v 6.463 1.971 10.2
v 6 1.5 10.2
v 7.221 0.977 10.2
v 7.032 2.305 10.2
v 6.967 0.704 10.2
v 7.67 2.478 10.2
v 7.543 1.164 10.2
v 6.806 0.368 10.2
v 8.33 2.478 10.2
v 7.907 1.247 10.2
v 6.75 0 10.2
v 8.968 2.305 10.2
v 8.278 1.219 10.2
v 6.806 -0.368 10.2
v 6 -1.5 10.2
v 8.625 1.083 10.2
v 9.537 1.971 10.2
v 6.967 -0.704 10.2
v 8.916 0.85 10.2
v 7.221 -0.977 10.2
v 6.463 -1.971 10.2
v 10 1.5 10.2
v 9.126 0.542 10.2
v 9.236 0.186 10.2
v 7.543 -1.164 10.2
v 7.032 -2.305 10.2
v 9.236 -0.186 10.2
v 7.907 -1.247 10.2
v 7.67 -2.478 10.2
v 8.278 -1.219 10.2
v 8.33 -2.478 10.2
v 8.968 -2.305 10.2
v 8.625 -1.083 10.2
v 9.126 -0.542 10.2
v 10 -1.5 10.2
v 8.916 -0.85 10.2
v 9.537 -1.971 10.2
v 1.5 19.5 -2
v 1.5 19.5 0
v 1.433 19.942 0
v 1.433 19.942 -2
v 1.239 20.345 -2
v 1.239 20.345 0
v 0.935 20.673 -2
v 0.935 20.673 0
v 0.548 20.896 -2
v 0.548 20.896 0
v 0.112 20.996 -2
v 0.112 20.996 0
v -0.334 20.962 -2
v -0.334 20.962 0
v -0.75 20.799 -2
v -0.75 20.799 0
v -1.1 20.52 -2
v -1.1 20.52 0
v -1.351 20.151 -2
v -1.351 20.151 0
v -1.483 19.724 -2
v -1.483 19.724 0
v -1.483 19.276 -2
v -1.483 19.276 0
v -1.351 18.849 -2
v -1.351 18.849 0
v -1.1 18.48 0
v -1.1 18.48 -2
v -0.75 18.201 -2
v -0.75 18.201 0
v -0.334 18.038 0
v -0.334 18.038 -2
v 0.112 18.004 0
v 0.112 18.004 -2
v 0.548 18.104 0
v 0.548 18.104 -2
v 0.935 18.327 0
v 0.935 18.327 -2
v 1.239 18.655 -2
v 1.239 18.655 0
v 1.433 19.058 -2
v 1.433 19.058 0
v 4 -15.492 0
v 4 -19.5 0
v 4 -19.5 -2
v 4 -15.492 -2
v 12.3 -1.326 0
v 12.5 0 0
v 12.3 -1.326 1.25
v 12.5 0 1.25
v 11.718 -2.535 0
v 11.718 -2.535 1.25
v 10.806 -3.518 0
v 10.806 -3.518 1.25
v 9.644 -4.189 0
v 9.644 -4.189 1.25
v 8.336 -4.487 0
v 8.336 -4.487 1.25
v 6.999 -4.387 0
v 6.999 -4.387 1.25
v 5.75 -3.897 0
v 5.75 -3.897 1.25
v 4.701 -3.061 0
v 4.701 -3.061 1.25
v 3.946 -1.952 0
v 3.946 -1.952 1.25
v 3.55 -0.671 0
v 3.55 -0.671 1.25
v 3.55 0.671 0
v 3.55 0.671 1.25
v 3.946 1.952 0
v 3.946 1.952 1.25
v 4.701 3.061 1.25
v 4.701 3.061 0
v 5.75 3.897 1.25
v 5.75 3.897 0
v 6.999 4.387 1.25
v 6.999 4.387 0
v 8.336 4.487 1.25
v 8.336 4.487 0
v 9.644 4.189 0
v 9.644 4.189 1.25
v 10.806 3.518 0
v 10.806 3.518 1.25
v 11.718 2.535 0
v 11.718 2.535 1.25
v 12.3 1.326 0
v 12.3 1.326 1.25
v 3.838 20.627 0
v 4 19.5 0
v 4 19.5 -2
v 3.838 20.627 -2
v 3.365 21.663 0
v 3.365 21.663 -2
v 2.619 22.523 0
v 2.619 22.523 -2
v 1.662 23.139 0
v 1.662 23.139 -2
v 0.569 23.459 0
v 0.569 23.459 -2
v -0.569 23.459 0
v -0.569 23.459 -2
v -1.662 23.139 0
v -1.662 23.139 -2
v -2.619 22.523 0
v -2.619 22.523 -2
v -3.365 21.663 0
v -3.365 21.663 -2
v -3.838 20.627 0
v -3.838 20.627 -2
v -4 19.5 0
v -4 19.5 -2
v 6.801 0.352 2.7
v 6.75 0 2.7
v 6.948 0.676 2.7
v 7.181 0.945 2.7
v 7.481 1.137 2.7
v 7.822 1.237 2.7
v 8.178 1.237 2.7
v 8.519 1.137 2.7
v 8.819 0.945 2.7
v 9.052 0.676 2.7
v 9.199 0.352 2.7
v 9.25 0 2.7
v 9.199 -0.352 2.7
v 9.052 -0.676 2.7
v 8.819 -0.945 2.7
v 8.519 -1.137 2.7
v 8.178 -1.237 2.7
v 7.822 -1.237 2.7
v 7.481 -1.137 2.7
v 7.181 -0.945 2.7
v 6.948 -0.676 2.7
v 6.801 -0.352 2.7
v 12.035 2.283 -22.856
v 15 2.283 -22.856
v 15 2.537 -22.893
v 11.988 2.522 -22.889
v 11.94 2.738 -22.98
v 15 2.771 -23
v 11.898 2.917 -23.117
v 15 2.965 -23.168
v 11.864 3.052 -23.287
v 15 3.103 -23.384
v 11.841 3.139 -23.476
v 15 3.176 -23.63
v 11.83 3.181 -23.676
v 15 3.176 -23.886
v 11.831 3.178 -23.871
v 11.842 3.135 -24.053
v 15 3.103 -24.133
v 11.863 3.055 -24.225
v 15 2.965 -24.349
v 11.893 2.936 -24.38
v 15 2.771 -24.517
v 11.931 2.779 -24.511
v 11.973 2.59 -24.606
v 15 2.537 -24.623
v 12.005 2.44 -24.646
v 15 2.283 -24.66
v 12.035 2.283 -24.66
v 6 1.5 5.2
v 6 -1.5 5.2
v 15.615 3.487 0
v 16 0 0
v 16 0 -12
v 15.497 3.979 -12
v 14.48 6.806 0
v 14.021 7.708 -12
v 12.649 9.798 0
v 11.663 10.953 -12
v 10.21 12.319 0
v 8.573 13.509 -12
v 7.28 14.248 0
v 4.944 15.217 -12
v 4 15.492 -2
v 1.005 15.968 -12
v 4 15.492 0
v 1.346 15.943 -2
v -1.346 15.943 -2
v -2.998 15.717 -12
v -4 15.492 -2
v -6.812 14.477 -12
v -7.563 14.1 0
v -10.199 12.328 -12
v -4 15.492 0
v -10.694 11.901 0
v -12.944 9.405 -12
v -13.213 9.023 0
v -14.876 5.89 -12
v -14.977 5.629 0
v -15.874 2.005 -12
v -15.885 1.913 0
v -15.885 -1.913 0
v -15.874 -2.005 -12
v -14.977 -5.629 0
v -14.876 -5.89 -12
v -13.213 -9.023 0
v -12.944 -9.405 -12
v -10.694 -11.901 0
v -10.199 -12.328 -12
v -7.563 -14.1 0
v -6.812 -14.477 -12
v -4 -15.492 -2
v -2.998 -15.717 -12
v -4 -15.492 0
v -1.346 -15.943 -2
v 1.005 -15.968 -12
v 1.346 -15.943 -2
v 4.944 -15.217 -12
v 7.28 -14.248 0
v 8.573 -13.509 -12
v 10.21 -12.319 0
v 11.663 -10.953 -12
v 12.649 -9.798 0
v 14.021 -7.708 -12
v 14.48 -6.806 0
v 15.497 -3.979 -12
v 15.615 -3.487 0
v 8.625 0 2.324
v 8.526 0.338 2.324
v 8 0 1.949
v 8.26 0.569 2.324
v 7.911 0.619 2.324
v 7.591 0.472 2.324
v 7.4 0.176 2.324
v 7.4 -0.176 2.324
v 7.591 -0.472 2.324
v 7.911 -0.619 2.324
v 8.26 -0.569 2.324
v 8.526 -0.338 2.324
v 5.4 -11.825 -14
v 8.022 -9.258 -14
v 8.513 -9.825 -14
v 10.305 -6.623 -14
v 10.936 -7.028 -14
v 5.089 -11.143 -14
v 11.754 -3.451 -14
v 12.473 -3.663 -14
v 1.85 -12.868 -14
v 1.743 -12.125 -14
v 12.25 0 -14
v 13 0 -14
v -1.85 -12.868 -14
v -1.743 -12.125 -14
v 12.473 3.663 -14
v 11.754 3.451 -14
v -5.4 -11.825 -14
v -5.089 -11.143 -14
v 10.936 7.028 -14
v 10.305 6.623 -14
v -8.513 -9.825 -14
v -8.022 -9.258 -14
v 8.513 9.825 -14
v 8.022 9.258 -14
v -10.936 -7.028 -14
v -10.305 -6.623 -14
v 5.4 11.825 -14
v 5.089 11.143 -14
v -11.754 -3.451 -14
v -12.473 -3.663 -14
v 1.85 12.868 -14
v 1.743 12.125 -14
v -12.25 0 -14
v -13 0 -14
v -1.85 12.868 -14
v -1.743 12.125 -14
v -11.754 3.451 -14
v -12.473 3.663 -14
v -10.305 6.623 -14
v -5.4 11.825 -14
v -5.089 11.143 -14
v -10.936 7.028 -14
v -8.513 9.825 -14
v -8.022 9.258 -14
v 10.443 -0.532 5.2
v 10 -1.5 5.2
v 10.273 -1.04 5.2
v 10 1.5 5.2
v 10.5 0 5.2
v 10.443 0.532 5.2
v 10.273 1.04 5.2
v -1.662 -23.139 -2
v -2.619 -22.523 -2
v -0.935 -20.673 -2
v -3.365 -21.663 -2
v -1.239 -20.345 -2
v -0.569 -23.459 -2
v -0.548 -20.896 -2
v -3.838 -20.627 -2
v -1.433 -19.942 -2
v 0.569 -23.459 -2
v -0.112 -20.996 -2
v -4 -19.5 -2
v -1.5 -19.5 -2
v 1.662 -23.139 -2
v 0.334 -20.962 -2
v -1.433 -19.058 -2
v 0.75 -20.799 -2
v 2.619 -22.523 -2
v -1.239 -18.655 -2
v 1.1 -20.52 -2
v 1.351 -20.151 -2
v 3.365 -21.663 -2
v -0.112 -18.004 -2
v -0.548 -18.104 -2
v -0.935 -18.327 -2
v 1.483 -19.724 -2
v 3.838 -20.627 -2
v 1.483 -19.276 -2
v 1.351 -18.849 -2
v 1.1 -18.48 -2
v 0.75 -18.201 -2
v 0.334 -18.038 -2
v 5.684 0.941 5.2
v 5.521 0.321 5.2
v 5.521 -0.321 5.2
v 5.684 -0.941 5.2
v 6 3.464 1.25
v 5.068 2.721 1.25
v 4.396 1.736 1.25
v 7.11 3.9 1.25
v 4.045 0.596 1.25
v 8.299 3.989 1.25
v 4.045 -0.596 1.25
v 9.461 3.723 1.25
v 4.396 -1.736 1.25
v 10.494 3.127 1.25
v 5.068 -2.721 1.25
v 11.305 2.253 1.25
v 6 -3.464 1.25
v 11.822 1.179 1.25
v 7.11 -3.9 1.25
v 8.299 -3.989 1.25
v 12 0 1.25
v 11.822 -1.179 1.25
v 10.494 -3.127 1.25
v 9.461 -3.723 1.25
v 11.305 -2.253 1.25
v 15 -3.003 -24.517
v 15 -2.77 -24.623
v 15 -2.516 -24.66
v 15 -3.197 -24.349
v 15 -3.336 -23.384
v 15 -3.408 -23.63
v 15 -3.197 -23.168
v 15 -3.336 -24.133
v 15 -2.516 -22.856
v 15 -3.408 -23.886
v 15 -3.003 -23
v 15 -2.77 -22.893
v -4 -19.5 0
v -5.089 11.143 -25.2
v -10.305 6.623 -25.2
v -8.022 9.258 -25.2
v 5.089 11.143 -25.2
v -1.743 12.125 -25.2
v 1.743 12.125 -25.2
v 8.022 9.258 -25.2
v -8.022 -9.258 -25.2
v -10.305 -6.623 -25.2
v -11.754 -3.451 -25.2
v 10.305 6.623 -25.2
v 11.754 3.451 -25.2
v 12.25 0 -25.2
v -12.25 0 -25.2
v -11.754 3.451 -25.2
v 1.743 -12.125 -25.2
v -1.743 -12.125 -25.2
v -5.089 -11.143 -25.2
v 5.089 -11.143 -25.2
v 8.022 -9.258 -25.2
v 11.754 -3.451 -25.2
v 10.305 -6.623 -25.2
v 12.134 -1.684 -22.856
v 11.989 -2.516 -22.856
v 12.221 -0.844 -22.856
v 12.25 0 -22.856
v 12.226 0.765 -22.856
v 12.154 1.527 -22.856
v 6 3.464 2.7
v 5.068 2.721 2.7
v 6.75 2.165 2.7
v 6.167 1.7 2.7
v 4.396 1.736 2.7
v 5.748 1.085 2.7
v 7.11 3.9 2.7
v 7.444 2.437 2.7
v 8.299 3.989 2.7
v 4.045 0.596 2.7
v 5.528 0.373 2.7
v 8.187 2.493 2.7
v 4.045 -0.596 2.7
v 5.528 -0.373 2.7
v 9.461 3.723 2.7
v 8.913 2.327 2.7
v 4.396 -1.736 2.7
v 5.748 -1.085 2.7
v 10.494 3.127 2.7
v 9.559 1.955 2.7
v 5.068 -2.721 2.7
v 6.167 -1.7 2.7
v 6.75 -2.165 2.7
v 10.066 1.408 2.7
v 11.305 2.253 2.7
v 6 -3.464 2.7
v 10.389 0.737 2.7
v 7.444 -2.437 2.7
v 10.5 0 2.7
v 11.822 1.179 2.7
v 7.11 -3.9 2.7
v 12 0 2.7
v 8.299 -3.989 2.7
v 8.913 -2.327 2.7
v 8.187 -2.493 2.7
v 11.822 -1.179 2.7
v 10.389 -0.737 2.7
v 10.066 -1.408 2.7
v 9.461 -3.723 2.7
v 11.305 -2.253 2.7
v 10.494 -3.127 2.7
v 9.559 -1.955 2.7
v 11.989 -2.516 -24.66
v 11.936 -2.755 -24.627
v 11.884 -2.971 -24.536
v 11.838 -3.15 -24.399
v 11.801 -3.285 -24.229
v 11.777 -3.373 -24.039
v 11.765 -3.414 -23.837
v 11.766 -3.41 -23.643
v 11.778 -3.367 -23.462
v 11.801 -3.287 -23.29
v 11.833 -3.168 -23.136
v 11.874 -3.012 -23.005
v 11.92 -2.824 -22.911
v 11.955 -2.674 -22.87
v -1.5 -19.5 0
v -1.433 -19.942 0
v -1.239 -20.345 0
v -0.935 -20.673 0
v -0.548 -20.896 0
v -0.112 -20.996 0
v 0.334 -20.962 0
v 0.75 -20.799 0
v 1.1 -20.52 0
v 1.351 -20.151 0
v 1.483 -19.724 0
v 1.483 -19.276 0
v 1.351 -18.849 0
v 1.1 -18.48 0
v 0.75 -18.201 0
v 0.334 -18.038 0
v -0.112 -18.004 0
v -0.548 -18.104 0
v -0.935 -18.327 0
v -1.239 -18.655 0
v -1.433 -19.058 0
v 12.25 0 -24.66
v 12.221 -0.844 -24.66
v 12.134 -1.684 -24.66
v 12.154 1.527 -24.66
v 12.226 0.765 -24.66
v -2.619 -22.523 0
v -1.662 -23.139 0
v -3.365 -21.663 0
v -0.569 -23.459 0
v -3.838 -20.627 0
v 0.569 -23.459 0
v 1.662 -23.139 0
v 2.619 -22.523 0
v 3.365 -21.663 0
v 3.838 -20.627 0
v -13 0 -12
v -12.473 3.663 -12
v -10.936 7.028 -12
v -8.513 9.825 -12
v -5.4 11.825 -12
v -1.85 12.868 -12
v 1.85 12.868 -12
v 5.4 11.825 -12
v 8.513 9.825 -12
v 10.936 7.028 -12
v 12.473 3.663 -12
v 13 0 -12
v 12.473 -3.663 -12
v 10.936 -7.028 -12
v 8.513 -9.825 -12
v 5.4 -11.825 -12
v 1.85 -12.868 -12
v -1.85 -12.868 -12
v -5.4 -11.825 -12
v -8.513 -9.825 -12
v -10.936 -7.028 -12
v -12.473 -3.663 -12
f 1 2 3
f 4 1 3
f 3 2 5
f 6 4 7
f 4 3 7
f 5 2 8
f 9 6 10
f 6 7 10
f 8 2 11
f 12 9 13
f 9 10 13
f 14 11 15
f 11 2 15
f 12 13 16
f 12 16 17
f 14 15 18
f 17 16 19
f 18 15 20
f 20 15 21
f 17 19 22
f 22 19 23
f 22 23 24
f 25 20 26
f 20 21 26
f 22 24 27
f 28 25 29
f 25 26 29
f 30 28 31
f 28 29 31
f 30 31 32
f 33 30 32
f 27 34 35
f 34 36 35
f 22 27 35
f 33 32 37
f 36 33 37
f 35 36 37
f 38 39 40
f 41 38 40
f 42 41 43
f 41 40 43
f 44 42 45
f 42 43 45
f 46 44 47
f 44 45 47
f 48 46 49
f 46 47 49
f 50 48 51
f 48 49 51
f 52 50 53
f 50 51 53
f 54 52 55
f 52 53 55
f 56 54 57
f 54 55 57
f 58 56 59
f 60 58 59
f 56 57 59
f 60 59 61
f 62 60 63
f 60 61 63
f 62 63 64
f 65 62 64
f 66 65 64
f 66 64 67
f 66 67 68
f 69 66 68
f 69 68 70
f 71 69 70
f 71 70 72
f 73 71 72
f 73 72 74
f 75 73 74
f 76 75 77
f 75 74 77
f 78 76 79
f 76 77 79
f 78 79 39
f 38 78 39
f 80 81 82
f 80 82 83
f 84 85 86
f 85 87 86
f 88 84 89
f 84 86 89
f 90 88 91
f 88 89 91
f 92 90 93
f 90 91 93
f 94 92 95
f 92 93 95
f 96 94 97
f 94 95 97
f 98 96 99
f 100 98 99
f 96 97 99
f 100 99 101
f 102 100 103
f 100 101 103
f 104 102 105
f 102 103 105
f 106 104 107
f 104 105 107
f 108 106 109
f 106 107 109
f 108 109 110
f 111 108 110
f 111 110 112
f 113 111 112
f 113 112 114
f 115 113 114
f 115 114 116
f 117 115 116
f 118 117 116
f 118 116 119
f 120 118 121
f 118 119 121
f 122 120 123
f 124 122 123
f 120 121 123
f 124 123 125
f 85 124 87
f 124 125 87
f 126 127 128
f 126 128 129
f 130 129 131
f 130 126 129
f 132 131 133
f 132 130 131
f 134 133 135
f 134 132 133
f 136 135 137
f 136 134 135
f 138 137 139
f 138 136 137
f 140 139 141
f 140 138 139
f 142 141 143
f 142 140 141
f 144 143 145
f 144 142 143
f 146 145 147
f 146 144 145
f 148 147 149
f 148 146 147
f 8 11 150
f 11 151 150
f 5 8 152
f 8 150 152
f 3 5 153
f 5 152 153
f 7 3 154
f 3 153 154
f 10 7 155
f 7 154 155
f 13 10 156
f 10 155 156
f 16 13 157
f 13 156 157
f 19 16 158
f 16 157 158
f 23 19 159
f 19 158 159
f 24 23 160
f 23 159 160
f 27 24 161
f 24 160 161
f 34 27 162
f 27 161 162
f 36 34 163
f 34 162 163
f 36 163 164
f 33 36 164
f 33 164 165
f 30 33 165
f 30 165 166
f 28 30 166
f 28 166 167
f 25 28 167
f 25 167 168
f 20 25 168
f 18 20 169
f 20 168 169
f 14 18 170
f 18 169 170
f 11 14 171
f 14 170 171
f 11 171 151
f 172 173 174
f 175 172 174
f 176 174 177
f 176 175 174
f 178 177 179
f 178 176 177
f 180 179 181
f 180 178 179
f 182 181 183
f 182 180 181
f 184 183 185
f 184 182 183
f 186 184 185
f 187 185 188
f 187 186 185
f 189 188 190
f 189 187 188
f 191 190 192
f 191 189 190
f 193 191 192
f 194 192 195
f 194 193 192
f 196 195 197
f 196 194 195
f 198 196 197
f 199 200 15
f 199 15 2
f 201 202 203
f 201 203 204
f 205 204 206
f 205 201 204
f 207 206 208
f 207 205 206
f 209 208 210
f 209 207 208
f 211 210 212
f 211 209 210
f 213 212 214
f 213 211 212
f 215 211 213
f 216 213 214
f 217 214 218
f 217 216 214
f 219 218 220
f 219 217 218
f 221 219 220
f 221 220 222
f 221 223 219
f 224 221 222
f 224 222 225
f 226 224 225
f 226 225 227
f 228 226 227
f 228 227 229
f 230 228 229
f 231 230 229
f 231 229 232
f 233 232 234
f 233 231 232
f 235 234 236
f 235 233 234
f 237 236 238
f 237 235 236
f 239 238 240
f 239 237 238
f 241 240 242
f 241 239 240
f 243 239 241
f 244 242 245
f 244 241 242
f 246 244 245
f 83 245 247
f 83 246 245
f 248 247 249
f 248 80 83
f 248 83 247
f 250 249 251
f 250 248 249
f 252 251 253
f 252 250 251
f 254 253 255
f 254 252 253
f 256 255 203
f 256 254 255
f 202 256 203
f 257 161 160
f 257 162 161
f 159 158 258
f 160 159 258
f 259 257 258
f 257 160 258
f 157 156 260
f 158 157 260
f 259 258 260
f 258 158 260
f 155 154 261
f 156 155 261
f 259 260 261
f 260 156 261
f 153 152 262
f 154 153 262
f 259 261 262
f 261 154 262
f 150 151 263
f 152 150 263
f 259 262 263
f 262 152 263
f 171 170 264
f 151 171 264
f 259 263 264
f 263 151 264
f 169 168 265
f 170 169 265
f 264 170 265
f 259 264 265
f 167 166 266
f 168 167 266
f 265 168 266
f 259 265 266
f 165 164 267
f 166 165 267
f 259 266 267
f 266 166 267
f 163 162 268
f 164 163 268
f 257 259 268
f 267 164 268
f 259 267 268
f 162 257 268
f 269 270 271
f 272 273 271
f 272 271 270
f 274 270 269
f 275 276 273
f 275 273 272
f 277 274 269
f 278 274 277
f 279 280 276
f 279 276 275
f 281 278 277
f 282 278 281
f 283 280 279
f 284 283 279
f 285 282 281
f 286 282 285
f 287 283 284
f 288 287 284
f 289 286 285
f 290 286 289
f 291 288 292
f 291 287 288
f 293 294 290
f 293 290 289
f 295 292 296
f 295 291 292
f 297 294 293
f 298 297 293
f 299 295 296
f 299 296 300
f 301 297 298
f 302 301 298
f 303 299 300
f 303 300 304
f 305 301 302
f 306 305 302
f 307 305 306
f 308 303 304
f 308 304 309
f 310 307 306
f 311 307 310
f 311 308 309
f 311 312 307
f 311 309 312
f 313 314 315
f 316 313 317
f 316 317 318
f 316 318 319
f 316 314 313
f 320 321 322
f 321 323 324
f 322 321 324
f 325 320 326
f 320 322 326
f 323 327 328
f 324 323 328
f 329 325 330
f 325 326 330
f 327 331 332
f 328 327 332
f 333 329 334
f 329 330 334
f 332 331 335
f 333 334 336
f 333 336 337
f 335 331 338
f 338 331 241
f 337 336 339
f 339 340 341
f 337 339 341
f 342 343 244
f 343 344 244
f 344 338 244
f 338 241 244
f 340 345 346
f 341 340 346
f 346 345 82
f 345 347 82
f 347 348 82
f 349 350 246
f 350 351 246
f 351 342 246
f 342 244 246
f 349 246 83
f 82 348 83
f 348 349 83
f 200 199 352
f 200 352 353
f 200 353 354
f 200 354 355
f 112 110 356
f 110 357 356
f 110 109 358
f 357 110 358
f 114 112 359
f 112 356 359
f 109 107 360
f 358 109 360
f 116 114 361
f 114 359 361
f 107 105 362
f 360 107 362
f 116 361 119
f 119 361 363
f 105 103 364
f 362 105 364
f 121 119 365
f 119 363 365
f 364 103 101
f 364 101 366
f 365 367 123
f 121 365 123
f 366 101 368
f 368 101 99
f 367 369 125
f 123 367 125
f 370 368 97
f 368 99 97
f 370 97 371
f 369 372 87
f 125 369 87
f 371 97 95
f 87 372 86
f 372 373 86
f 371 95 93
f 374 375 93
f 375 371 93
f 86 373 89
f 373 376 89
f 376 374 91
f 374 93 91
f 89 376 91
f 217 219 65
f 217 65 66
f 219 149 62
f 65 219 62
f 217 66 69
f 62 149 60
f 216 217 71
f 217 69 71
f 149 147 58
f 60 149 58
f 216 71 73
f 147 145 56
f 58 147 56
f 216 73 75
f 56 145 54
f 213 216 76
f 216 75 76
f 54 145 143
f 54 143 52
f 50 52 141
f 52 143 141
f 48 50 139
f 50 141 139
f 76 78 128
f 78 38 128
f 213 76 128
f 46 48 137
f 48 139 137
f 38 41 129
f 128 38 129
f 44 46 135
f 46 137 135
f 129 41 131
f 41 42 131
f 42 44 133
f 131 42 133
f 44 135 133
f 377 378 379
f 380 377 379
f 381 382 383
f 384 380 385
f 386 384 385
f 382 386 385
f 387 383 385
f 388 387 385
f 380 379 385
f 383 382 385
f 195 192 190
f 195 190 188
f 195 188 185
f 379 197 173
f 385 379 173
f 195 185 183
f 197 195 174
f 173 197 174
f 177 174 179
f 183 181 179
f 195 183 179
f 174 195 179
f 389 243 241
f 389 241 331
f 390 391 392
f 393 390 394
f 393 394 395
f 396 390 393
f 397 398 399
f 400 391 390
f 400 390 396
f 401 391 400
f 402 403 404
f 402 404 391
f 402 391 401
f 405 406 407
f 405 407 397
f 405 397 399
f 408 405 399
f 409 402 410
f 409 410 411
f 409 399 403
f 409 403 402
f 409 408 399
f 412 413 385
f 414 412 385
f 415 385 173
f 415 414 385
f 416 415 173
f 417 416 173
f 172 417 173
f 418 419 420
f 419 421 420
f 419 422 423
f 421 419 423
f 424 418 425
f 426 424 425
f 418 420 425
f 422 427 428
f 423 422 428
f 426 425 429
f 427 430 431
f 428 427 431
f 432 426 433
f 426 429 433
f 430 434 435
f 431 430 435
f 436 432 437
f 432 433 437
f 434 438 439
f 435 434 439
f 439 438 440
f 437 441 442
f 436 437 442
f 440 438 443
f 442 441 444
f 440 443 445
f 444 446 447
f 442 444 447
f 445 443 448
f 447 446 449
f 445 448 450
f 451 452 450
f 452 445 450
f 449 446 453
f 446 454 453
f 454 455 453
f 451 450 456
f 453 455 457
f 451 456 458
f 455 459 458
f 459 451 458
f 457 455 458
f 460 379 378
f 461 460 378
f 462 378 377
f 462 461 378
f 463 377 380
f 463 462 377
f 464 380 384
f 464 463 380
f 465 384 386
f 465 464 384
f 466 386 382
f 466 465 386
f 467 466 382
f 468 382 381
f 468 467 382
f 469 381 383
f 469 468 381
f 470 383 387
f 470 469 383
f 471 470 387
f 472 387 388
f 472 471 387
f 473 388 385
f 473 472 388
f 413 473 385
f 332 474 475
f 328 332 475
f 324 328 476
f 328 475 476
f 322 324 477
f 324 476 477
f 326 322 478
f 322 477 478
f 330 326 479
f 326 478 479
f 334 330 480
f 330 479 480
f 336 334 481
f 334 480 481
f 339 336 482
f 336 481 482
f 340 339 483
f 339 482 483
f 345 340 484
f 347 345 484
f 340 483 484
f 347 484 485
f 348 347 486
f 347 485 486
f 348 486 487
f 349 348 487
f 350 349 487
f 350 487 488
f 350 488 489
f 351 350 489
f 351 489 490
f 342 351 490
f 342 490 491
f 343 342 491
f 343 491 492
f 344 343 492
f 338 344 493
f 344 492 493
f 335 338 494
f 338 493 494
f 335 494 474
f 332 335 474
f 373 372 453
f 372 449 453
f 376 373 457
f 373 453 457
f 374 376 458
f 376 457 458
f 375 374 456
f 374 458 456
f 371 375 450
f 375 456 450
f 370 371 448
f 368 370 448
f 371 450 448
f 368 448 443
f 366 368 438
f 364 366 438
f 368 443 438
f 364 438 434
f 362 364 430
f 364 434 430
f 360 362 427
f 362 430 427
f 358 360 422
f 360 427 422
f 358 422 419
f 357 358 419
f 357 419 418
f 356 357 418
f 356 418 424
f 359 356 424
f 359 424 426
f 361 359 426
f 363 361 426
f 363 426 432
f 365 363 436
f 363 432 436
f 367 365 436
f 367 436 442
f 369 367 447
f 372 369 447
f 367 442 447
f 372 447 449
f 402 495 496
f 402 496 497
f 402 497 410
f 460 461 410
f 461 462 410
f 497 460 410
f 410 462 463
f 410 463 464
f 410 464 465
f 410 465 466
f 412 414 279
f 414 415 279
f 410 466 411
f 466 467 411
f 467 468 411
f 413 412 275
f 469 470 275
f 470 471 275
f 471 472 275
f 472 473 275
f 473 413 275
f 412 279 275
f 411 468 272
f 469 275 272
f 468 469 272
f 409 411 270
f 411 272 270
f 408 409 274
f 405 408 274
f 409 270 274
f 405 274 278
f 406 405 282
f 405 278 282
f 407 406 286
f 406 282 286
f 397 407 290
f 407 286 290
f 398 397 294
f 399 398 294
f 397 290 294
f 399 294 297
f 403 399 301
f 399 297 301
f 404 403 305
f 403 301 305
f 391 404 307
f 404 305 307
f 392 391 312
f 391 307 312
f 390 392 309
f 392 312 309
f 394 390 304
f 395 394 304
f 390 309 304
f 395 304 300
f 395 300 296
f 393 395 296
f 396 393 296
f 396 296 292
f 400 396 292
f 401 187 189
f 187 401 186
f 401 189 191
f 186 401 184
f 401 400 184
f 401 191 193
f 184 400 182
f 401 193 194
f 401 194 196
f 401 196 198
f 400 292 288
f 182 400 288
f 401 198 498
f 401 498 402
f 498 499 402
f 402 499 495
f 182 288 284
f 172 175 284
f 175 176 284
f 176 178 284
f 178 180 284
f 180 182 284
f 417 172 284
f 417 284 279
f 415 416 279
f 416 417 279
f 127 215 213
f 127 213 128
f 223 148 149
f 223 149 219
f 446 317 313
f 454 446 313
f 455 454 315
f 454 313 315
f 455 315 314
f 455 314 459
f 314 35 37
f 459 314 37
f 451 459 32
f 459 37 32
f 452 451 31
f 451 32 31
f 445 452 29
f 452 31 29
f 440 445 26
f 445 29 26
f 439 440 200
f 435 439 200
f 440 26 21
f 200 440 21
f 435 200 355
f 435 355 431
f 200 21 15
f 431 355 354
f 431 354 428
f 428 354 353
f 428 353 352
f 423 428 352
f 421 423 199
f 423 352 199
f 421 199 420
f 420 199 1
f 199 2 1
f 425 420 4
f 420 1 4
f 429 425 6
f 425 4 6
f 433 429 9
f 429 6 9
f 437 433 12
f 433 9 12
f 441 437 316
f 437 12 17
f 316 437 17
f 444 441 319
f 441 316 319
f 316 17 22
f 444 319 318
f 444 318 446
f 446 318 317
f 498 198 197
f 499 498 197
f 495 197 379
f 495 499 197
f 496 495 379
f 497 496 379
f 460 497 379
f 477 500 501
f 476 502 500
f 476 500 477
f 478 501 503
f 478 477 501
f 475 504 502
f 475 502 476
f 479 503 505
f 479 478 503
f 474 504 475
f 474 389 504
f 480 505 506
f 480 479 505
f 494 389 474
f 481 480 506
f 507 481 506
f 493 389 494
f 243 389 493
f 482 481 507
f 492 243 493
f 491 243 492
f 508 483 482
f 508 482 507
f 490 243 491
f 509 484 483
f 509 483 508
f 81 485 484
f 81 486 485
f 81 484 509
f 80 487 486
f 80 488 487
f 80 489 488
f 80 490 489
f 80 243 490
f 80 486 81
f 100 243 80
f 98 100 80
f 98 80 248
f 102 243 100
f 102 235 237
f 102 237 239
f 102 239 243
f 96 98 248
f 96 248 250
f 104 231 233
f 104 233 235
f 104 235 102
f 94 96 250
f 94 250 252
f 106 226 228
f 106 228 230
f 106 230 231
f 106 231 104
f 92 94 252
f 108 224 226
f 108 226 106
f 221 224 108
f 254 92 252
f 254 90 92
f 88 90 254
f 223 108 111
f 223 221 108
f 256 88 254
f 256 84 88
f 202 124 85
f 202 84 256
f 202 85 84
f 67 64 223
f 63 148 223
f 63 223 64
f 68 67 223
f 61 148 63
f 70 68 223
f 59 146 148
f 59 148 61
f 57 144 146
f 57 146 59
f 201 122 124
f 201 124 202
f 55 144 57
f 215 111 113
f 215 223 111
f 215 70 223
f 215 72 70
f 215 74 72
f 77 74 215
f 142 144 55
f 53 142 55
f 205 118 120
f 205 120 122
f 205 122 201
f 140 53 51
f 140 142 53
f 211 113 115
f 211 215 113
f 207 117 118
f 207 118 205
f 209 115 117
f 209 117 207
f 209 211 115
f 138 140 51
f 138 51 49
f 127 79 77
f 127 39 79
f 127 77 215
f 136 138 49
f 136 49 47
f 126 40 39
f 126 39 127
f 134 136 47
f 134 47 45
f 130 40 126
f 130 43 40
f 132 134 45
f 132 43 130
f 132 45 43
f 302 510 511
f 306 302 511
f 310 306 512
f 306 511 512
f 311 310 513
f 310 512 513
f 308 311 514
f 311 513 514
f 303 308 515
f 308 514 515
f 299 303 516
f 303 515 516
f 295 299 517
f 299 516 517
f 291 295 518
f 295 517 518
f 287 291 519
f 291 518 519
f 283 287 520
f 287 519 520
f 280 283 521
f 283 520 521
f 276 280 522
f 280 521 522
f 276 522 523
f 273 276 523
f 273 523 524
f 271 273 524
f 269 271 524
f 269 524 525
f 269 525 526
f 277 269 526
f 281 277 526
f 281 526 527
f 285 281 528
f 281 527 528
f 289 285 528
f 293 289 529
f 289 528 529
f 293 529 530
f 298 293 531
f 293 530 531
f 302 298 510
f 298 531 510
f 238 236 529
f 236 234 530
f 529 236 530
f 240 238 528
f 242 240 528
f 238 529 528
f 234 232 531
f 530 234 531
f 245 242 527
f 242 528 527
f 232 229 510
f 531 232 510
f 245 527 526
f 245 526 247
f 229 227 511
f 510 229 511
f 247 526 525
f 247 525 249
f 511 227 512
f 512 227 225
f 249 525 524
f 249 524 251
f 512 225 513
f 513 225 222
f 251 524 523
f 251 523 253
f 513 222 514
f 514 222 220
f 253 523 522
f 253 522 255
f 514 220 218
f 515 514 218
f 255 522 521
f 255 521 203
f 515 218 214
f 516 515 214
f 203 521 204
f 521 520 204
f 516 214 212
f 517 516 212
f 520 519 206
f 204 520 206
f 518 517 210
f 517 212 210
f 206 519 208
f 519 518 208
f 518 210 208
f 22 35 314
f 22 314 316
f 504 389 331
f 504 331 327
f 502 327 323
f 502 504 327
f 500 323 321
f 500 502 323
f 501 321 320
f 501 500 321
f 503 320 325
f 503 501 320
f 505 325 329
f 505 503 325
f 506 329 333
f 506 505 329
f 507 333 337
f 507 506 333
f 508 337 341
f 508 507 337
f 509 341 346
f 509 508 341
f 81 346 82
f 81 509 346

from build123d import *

# Parameters (mm, degrees)
SKETCH_1_R             = 16
EXTRUDE_1_DEPTH        = 12
SKETCH_2_R             = 13
EXTRUDE_2_DEPTH        = 2
SKETCH_3_R             = 12.25
EXTRUDE_4_DEPTH        = 11.2
SKETCH_4_R             = 1.5
EXTRUDE_5_DEPTH        = 2
SKETCH_21_W            = 0.599041837
SKETCH_21_H            = 5.051087673
CUT_EXTRUDE_2_DEPTH    = 5
HOLE_WIZARD_M3_1_D     = 2.5
HOLE_WIZARD_M3_1_DEPTH = 7.5
HOLE_WIZARD_M3_1_TIP   = 0.751075774
EXTRUDE_16_DEPTH       = 15


with BuildPart() as part:
    # 草图1 → 凸台-拉伸1 (new body)
    with BuildSketch(Plane.XY):
        Circle(SKETCH_1_R)
    extrude(amount=-EXTRUDE_1_DEPTH)

    # 草图2 → 凸台-拉伸2 (add)
    with BuildSketch(Plane(origin=(0, 0, -12), x_dir=(-1, 0, 0), z_dir=(0, 0, -1))):
        Circle(SKETCH_2_R)
    extrude(amount=EXTRUDE_2_DEPTH)

    # 草图3 → 凸台-拉伸4 (add)
    with BuildSketch(Plane(origin=(0, 0, -14), x_dir=(-1, 0, 0), z_dir=(0, 0, -1))):
        with Locations(Location((0, 0, 0), (0, 0, 180))):
            Circle(SKETCH_3_R)
    extrude(amount=EXTRUDE_4_DEPTH)

    # 草图4 → 凸台-拉伸5 (add)
    # profile 1 of 2: a face of its own
    with BuildSketch(Plane.XY):
        with BuildLine():
            Line((-4, 19.5), (-4, 15.491933385))
            ThreePointArc((-4, 15.491933385), (0, 16), (4, 15.491933385))
            Line((4, 15.491933385), (4, 19.5))
            ThreePointArc((4, 19.5), (0, 23.5), (-4, 19.5))
        make_face()
        with Locations((0, 19.5)):
            Circle(SKETCH_4_R, mode=Mode.SUBTRACT)
    # profile 2 of 2: a face of its own
    with BuildSketch(Plane.XY):
        with BuildLine():
            Line((-4, -15.491933385), (-4, -19.5))
            ThreePointArc((-4, -19.5), (0, -23.5), (4, -19.5))
            Line((4, -19.5), (4, -15.491933385))
            ThreePointArc((4, -15.491933385), (0, -16), (-4, -15.491933385))
        make_face()
        with Locations(Location((0, -19.5, 0), (0, 0, 180))):
            Circle(SKETCH_4_R, mode=Mode.SUBTRACT)
    extrude(amount=-EXTRUDE_5_DEPTH)

    # 草图17 → 旋转1 (revolve)
    with BuildSketch(Plane(origin=(0, 0, 0), x_dir=(1, 0, 0), z_dir=(0, 1, 0)), mode=Mode.PRIVATE) as revolve_1_sk:
        Polygon((8, -10.2), (8, 0), (3.5, 0), (3.5, -1.25), (4, -1.25), (4, -2.7), (5.5, -2.7), (5.5, -10.2), align=None)
    revolve(revolve_1_sk.sketch.rotate(Axis((8, 0, 10.2), (0, 0, -1)), 180), axis=Axis((8, 0, 10.2), (0, 0, -1)))

    # 草图21 → 切除-拉伸2 (cut)
    with BuildSketch(Plane.XY.offset(10.2)):
        with Locations((5.700479082, -0.105298995)):
            Rectangle(SKETCH_21_W, SKETCH_21_H)
        with Locations((10.299520919, -0.105298995)):
            Rectangle(SKETCH_21_W, SKETCH_21_H)
    extrude(amount=-CUT_EXTRUDE_2_DEPTH, mode=Mode.SUBTRACT)

    # M3 螺纹孔1
    with Locations(Plane.XY.offset(10.2)):
        with Locations((8, 0)):
            Hole(HOLE_WIZARD_M3_1_D / 2, depth=HOLE_WIZARD_M3_1_DEPTH)
            with Locations((0, 0, -(HOLE_WIZARD_M3_1_DEPTH + HOLE_WIZARD_M3_1_TIP / 2))):  # 118° drill point
                Cone(0, HOLE_WIZARD_M3_1_D / 2, HOLE_WIZARD_M3_1_TIP, mode=Mode.SUBTRACT)

    # 草图25 → 凸台-拉伸16 (add)
    with BuildSketch(Plane(origin=(0, 0, 0), x_dir=(0, 0, -1), z_dir=(1, 0, 0))):
        with BuildLine():
            Line((24.65972398, 2.283115818), (24.65972398, -2.515790041))
            ThreePointArc((24.65972398, -2.515790041), (23.758111364, -3.417402657), (22.856498748, -2.515790041))
            Line((22.856498748, -2.515790041), (22.856498748, 2.283115818))
            ThreePointArc((22.856498748, 2.283115818), (23.758111364, 3.184728434), (24.65972398, 2.283115818))
        make_face()
    extrude(amount=EXTRUDE_16_DEPTH)


solid = part.part
